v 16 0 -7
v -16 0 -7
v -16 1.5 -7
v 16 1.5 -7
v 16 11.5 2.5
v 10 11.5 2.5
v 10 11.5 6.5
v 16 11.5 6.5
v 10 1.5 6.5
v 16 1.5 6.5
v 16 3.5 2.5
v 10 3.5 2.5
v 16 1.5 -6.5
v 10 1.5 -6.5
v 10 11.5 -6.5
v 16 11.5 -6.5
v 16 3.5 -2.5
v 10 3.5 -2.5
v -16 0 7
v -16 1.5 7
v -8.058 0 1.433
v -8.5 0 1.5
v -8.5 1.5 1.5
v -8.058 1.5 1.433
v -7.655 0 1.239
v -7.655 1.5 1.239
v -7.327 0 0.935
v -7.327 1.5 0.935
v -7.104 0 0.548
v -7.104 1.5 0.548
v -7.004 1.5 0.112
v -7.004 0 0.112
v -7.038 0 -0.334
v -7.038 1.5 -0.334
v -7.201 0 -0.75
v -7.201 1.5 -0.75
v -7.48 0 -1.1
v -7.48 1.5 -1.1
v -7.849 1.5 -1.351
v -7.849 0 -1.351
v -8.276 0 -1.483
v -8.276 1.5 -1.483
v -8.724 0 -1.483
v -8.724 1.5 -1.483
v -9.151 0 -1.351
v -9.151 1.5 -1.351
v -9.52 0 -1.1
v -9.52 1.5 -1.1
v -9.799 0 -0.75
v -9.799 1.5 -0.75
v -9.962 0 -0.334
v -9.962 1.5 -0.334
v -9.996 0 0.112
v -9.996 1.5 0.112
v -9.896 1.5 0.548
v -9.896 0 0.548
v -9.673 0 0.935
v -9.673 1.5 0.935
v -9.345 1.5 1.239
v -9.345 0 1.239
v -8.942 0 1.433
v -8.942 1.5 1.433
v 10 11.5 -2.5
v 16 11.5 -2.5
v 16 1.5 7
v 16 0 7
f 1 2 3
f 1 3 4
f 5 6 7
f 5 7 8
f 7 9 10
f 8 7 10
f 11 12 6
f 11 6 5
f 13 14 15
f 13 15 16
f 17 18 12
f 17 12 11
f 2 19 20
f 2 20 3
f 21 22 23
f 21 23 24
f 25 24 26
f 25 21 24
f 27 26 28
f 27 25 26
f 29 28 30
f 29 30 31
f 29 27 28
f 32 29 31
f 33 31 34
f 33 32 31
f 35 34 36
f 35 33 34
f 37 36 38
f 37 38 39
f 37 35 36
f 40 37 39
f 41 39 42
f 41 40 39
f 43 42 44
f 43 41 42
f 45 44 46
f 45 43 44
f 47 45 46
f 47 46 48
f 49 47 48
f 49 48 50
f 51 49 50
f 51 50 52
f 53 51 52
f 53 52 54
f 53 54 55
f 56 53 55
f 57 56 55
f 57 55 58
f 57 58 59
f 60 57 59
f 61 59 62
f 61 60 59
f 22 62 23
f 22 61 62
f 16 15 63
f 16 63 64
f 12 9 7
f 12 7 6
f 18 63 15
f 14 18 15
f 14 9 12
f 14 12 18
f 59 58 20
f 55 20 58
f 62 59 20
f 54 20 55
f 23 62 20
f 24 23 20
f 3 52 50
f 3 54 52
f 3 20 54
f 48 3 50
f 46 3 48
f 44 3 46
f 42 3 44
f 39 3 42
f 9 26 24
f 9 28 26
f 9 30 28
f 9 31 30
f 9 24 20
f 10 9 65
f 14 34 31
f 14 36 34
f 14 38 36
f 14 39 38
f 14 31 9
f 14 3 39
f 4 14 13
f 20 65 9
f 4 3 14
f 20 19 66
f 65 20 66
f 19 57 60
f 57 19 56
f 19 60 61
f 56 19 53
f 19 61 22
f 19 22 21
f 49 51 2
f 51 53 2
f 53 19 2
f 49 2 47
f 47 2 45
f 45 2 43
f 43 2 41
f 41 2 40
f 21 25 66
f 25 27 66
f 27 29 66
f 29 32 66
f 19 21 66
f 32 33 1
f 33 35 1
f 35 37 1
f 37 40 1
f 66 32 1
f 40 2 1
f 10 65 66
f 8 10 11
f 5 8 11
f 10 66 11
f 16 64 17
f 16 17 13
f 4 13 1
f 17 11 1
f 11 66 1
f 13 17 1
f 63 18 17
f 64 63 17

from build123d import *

# Parameters (mm, degrees)
SKETCH1_W           = 32
SKETCH1_H           = 14
SKETCH1_R           = 1.5
BOSS_EXTRUDE1_DEPTH = 1.5
SKETCH2_W           = 6
SKETCH2_H           = 13
BOSS_EXTRUDE2_DEPTH = 2
SKETCH3_W           = 6
SKETCH3_H           = 4
BOSS_EXTRUDE3_DEPTH = 8


with BuildPart() as part:
    # Sketch1 → Boss-Extrude1 (new body)
    with BuildSketch(Plane(origin=(0, 0, 0), x_dir=(1, 0, 0), z_dir=(0, 1, 0))):
        Rectangle(SKETCH1_W, SKETCH1_H)
        with Locations(Location((-8.5, 0, 0), (0, 0, 270))):
            Circle(SKETCH1_R, mode=Mode.SUBTRACT)
    extrude(amount=BOSS_EXTRUDE1_DEPTH)

    # Sketch2 → Boss-Extrude2 (add)
    with BuildSketch(Plane(origin=(0, 1.5, 0), x_dir=(1, 0, 0), z_dir=(0, 1, 0))):
        with Locations((13, 0)):
            Rectangle(SKETCH2_W, SKETCH2_H)
    extrude(amount=BOSS_EXTRUDE2_DEPTH)

    # Sketch3 → Boss-Extrude3 (add)
    with BuildSketch(Plane(origin=(0, 3.5, 0), x_dir=(1, 0, 0), z_dir=(0, 1, 0))):
        with Locations((13, 4.5)):
            Rectangle(SKETCH3_W, SKETCH3_H)
        with Locations((13, -4.5)):
            Rectangle(SKETCH3_W, SKETCH3_H)
    extrude(amount=BOSS_EXTRUDE3_DEPTH)


solid = part.part
